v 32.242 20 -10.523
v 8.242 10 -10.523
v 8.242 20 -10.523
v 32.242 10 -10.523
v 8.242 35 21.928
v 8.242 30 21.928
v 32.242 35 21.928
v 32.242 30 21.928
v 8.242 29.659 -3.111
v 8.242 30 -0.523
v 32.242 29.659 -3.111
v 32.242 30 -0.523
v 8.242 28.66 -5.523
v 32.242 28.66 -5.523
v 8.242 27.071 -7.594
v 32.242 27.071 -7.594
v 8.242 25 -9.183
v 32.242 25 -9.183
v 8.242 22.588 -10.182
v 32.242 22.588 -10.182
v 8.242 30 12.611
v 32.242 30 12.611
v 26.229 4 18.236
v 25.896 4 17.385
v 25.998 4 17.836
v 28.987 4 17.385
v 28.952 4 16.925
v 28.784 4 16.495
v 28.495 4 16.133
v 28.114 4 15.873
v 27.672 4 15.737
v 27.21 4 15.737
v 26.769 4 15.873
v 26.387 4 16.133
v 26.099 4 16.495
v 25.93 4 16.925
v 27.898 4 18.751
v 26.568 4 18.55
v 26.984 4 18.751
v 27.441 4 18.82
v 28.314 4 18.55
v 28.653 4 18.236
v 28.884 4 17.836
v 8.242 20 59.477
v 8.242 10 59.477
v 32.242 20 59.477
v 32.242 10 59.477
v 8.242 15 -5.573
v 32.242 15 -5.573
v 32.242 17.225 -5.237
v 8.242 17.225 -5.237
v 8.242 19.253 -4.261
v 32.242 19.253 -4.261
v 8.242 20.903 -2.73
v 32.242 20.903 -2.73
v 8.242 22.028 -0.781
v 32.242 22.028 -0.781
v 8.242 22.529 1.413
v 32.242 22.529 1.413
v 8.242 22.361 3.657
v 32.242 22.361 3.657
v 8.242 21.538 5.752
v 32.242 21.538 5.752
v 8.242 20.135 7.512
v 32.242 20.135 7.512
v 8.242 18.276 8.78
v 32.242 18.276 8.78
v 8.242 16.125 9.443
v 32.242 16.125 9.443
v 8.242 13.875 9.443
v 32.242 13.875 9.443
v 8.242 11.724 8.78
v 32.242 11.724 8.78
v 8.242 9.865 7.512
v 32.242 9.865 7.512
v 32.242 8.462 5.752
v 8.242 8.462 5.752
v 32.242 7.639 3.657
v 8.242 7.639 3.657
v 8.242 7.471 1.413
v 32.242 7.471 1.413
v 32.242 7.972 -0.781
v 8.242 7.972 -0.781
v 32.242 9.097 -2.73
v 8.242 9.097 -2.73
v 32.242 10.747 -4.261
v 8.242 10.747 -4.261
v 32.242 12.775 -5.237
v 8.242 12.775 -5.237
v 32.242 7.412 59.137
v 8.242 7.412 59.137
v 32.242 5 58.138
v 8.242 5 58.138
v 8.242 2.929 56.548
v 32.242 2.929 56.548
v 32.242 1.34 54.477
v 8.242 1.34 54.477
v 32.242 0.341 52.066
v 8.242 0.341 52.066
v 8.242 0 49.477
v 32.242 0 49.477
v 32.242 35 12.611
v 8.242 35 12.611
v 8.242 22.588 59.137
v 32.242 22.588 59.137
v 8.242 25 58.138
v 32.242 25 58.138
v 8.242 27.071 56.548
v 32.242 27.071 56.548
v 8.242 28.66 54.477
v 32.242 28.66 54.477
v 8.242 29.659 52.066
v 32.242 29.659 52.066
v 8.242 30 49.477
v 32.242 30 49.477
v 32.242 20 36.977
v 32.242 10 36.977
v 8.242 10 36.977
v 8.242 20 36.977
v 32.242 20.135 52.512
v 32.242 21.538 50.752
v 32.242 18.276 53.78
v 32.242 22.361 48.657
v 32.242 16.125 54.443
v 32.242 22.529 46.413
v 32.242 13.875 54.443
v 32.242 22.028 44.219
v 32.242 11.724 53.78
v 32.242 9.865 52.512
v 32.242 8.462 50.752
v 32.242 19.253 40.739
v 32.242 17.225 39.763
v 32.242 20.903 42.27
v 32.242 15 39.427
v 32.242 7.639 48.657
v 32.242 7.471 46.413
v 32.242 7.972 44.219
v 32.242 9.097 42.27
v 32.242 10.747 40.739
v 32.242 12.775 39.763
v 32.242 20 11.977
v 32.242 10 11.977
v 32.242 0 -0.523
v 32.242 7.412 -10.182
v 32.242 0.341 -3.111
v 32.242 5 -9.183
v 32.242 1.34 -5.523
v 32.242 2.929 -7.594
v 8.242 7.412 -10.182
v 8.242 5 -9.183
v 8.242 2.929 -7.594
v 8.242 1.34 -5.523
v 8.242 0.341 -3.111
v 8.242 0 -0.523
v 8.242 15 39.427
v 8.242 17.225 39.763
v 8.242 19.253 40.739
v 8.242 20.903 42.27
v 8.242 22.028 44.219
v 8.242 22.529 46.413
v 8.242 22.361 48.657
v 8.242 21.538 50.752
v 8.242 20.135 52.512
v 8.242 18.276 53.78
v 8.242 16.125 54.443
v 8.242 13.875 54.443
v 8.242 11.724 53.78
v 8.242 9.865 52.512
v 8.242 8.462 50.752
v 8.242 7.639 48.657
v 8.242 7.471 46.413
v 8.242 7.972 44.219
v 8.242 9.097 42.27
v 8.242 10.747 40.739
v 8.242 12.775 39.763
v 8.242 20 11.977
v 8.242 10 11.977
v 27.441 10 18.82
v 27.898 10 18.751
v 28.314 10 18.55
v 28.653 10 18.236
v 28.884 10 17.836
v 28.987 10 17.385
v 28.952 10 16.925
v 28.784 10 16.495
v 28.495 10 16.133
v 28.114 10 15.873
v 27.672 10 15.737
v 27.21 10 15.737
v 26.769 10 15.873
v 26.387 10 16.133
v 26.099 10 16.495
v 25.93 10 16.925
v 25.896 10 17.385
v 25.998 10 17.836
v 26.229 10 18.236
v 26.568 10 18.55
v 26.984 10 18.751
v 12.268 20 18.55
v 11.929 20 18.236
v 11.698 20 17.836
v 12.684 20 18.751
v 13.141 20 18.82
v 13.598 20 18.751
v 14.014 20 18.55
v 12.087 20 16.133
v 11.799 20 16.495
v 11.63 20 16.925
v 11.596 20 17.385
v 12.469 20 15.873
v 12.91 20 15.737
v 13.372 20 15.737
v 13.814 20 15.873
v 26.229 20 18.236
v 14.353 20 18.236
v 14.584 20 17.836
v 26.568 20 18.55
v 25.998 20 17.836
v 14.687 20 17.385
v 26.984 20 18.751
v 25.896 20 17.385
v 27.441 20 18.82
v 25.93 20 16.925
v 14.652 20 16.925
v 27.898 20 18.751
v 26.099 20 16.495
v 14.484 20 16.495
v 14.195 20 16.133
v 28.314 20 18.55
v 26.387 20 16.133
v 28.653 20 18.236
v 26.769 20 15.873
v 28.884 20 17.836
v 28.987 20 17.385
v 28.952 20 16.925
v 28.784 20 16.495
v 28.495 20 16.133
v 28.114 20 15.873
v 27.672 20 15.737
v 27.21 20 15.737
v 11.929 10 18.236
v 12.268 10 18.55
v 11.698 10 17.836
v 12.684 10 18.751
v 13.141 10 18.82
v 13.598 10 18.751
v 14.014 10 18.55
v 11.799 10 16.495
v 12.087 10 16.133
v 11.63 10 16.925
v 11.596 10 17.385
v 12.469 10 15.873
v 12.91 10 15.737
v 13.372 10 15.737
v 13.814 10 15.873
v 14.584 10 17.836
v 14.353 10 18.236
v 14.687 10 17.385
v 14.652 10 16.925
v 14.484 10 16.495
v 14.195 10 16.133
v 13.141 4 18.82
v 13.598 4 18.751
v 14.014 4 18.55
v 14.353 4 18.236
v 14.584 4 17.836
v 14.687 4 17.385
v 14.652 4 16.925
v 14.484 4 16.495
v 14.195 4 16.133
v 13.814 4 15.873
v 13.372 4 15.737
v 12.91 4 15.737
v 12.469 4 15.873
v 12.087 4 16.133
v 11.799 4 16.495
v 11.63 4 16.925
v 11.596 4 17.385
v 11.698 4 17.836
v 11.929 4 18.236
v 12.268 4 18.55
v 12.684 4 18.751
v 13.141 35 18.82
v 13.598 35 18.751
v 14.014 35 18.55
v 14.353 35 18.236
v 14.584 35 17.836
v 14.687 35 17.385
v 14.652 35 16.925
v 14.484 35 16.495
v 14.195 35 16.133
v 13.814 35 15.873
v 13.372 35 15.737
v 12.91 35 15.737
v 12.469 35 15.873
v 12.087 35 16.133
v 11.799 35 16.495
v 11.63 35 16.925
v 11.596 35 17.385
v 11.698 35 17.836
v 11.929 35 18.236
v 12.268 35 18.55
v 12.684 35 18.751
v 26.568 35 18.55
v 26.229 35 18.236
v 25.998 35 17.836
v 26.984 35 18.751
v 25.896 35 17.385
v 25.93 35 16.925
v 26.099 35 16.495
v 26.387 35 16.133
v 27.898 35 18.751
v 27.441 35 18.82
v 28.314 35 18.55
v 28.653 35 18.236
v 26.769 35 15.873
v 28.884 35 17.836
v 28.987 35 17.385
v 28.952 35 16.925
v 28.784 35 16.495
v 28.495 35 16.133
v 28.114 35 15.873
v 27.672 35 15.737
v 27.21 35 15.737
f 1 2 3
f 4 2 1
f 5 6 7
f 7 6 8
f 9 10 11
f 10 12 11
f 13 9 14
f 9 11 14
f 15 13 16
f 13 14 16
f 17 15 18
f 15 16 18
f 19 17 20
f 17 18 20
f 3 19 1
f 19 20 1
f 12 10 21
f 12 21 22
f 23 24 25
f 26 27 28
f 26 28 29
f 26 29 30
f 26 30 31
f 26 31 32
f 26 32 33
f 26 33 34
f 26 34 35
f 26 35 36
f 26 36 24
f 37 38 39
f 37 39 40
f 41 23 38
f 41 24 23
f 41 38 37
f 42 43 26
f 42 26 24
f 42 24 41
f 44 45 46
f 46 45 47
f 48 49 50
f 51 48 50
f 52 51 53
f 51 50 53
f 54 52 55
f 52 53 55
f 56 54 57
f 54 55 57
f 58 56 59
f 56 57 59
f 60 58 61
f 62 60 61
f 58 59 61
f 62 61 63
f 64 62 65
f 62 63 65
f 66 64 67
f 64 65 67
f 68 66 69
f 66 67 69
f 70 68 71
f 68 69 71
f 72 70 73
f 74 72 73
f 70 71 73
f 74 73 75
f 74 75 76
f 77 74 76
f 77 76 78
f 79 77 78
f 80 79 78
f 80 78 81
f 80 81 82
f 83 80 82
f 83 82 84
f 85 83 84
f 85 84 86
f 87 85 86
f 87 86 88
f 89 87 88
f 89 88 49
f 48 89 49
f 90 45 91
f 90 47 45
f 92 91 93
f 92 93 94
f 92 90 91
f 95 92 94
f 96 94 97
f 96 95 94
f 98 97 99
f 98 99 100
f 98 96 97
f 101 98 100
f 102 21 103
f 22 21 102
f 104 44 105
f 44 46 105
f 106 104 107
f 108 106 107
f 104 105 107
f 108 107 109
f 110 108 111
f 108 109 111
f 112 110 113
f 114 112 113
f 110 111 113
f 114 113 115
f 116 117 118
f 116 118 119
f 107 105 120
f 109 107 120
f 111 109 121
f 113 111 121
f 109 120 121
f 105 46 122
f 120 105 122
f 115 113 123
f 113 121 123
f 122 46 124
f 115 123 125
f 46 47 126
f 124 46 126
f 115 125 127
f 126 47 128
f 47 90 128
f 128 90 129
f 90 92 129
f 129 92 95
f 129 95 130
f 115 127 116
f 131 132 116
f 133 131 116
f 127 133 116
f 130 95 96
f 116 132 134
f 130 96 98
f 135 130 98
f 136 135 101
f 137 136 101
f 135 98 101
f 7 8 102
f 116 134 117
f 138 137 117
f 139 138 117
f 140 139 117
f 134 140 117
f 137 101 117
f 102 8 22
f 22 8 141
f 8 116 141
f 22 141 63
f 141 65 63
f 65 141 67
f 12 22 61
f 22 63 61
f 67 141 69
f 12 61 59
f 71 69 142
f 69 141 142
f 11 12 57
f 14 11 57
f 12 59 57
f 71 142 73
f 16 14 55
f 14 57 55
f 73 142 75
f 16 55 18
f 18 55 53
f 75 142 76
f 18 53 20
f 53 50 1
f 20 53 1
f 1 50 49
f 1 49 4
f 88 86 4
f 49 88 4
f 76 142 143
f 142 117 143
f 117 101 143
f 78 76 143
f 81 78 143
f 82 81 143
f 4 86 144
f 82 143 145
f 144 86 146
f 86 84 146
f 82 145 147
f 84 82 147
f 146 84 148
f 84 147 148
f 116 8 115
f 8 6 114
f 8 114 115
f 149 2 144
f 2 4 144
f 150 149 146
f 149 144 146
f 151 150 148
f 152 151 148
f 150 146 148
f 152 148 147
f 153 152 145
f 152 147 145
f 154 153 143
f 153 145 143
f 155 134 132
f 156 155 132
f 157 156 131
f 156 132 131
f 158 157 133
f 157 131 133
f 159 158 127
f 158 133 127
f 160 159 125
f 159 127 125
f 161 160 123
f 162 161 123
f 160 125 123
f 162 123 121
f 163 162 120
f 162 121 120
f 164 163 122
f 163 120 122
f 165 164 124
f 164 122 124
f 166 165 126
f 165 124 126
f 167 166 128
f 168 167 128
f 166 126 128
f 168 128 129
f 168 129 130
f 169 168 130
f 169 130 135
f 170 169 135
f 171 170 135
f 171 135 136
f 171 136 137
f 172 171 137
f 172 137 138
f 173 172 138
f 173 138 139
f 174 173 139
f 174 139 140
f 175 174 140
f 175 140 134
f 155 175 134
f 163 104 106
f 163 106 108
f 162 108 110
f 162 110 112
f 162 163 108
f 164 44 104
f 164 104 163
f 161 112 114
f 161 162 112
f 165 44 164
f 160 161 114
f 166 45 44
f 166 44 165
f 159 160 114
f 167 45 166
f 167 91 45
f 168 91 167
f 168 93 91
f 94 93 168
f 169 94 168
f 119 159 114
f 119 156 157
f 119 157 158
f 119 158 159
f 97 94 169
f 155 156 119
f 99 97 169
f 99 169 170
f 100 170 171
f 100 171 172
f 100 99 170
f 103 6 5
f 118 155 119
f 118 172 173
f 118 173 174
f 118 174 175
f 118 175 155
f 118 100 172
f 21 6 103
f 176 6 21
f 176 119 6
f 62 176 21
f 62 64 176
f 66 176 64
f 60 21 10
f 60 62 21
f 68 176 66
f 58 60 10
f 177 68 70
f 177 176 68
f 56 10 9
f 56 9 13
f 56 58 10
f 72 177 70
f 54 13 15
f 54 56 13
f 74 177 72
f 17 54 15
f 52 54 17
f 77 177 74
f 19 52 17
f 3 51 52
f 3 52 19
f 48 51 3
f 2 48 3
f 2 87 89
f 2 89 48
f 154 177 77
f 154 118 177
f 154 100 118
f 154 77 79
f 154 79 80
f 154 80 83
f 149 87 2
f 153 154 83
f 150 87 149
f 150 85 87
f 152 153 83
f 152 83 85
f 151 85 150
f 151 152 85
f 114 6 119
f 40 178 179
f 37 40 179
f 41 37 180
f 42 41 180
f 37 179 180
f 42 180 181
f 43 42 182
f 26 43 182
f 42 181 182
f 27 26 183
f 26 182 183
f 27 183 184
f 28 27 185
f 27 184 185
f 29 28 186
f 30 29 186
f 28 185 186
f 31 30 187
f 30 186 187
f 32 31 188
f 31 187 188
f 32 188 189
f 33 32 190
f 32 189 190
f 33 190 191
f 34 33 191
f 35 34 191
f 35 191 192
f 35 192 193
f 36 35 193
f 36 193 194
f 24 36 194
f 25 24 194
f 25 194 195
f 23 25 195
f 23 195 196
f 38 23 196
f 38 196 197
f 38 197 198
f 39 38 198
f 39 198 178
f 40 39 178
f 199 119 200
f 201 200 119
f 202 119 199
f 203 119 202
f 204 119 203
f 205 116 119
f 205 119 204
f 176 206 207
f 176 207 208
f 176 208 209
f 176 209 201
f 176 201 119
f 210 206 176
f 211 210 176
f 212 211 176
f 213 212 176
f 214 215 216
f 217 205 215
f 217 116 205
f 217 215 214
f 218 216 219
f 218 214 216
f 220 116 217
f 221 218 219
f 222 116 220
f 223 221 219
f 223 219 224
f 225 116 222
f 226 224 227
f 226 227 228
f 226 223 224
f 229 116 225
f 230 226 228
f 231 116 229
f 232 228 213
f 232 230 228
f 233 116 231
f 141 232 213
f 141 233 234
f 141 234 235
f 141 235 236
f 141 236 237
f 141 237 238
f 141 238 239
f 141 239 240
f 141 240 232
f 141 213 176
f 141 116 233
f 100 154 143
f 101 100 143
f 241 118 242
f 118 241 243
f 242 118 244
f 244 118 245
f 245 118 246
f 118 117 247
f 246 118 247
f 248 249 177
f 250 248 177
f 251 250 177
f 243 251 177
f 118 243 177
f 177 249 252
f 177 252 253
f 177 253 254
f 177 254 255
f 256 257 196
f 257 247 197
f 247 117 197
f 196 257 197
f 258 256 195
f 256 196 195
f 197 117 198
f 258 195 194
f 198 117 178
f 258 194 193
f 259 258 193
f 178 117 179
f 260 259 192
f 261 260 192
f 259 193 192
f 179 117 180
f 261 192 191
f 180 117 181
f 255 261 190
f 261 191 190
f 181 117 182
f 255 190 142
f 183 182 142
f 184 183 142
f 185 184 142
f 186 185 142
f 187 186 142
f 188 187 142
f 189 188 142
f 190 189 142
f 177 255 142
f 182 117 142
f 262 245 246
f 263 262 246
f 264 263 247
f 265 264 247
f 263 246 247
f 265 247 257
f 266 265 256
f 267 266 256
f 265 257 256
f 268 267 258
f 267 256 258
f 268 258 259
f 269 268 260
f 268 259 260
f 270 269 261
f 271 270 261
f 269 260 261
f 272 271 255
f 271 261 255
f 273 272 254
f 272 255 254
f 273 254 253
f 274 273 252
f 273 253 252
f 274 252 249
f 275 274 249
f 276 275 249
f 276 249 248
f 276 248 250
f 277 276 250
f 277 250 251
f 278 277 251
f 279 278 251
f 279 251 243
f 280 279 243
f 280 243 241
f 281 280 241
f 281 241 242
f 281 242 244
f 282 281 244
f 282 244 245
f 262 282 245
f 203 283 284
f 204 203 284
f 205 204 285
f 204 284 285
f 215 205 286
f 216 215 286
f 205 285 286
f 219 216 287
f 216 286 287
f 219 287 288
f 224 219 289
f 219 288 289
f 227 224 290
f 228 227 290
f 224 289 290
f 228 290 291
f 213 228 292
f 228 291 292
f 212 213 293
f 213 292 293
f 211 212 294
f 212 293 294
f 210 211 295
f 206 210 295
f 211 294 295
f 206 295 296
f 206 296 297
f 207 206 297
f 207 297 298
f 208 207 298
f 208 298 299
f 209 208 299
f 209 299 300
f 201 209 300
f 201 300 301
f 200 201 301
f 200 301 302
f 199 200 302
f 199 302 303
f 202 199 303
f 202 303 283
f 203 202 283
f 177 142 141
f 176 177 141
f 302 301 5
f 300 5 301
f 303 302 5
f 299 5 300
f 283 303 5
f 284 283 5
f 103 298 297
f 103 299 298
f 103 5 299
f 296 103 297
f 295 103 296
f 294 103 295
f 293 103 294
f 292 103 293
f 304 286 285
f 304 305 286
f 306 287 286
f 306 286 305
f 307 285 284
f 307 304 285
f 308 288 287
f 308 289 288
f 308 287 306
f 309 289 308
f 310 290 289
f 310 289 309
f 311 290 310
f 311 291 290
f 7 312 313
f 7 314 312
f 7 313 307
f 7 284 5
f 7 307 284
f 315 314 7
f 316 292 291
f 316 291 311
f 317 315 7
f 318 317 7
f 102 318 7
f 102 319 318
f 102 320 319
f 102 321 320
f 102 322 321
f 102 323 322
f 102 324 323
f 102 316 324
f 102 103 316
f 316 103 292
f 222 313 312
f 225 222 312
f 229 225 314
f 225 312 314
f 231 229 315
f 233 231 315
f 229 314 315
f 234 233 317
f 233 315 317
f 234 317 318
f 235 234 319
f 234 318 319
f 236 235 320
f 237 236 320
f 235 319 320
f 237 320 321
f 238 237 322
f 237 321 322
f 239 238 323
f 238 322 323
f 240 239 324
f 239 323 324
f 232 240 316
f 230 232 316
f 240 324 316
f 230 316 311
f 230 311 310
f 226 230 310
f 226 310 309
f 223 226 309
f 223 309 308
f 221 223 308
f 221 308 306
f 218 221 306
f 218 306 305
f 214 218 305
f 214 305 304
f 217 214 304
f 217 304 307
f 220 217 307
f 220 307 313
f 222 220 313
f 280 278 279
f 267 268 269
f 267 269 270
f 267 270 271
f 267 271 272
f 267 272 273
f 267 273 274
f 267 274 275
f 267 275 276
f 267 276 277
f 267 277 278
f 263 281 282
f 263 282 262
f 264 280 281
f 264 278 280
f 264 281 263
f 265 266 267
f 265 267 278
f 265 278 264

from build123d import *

# Parameters (mm, degrees)
SKETCH_1_W          = 24
SKETCH_1_H          = 70
EXTRUDE_1_DEPTH     = 30
SKETCH_2_R          = 7.55
CUT_EXTRUDE_1_DEPTH = 71.806439045
SKETCH_3_W          = 25
SKETCH_3_H          = 10
CUT_EXTRUDE_2_DEPTH = 71.806439045
SKETCH_4_W          = 24
SKETCH_4_H          = 9.317438099
EXTRUDE_2_DEPTH     = 5
SKETCH_5_R          = 1.55
CUT_EXTRUDE_3_DEPTH = 31
FILLET_1_R          = 10


with BuildPart() as part:
    # 草图1 → 凸台-拉伸1 (new body)
    with BuildSketch(Plane(origin=(0, 0, 0), x_dir=(1, 0, 0), z_dir=(0, 1, 0))):
        with Locations((20.241900648, -24.477321814)):
            Rectangle(SKETCH_1_W, SKETCH_1_H)
    extrude(amount=EXTRUDE_1_DEPTH)

    # 草图2 → 切除-拉伸1 (cut, through all)
    with BuildSketch(Plane(origin=(32.241900648, 0, 0), x_dir=(0, 0, -1), z_dir=(1, 0, 0))):
        with Locations((-46.977321814, 15)):
            Circle(SKETCH_2_R)
        with Locations((-1.977321814, 15)):
            Circle(SKETCH_2_R)
    extrude(amount=-CUT_EXTRUDE_1_DEPTH, mode=Mode.SUBTRACT)

    # 草图3 → 切除-拉伸2 (cut, through all)
    with BuildSketch(Plane(origin=(32.241900648, 0, 0), x_dir=(0, 0, -1), z_dir=(1, 0, 0))):
        with Locations((-24.477321814, 15)):
            Rectangle(SKETCH_3_W, SKETCH_3_H)
    extrude(amount=-CUT_EXTRUDE_2_DEPTH, mode=Mode.SUBTRACT)

    # 草图4 → 凸台-拉伸2 (add)
    with BuildSketch(Plane(origin=(0, 30, 0), x_dir=(1, 0, 0), z_dir=(0, 1, 0))):
        with Locations((20.241900648, -17.269567559)):
            Rectangle(SKETCH_4_W, SKETCH_4_H)
    extrude(amount=EXTRUDE_2_DEPTH)

    # 草图5 → 切除-拉伸3 (cut)
    with BuildSketch(Plane(origin=(0, 35, 0), x_dir=(1, 0, 0), z_dir=(0, 1, 0))):
        with Locations(Location((27.441174565, -17.269567558, 0), (0, 0, 270))):
            Circle(SKETCH_5_R)
        with Locations(Location((13.141174565, -17.269567558, 0), (0, 0, 270))):
            Circle(SKETCH_5_R)
    extrude(amount=-CUT_EXTRUDE_3_DEPTH, mode=Mode.SUBTRACT)

    # 圆角1
    fillet_1_edges = [part.edges().sort_by_distance(p)[0] for p in [
        (20.241900648, 30, -10.522678186),
        (20.241900648, 0, -10.522678186),
        (20.241900648, 0, 59.477321814),
        (20.241900648, 30, 59.477321814),
    ]]
    fillet(fillet_1_edges, radius=FILLET_1_R)


solid = part.part
